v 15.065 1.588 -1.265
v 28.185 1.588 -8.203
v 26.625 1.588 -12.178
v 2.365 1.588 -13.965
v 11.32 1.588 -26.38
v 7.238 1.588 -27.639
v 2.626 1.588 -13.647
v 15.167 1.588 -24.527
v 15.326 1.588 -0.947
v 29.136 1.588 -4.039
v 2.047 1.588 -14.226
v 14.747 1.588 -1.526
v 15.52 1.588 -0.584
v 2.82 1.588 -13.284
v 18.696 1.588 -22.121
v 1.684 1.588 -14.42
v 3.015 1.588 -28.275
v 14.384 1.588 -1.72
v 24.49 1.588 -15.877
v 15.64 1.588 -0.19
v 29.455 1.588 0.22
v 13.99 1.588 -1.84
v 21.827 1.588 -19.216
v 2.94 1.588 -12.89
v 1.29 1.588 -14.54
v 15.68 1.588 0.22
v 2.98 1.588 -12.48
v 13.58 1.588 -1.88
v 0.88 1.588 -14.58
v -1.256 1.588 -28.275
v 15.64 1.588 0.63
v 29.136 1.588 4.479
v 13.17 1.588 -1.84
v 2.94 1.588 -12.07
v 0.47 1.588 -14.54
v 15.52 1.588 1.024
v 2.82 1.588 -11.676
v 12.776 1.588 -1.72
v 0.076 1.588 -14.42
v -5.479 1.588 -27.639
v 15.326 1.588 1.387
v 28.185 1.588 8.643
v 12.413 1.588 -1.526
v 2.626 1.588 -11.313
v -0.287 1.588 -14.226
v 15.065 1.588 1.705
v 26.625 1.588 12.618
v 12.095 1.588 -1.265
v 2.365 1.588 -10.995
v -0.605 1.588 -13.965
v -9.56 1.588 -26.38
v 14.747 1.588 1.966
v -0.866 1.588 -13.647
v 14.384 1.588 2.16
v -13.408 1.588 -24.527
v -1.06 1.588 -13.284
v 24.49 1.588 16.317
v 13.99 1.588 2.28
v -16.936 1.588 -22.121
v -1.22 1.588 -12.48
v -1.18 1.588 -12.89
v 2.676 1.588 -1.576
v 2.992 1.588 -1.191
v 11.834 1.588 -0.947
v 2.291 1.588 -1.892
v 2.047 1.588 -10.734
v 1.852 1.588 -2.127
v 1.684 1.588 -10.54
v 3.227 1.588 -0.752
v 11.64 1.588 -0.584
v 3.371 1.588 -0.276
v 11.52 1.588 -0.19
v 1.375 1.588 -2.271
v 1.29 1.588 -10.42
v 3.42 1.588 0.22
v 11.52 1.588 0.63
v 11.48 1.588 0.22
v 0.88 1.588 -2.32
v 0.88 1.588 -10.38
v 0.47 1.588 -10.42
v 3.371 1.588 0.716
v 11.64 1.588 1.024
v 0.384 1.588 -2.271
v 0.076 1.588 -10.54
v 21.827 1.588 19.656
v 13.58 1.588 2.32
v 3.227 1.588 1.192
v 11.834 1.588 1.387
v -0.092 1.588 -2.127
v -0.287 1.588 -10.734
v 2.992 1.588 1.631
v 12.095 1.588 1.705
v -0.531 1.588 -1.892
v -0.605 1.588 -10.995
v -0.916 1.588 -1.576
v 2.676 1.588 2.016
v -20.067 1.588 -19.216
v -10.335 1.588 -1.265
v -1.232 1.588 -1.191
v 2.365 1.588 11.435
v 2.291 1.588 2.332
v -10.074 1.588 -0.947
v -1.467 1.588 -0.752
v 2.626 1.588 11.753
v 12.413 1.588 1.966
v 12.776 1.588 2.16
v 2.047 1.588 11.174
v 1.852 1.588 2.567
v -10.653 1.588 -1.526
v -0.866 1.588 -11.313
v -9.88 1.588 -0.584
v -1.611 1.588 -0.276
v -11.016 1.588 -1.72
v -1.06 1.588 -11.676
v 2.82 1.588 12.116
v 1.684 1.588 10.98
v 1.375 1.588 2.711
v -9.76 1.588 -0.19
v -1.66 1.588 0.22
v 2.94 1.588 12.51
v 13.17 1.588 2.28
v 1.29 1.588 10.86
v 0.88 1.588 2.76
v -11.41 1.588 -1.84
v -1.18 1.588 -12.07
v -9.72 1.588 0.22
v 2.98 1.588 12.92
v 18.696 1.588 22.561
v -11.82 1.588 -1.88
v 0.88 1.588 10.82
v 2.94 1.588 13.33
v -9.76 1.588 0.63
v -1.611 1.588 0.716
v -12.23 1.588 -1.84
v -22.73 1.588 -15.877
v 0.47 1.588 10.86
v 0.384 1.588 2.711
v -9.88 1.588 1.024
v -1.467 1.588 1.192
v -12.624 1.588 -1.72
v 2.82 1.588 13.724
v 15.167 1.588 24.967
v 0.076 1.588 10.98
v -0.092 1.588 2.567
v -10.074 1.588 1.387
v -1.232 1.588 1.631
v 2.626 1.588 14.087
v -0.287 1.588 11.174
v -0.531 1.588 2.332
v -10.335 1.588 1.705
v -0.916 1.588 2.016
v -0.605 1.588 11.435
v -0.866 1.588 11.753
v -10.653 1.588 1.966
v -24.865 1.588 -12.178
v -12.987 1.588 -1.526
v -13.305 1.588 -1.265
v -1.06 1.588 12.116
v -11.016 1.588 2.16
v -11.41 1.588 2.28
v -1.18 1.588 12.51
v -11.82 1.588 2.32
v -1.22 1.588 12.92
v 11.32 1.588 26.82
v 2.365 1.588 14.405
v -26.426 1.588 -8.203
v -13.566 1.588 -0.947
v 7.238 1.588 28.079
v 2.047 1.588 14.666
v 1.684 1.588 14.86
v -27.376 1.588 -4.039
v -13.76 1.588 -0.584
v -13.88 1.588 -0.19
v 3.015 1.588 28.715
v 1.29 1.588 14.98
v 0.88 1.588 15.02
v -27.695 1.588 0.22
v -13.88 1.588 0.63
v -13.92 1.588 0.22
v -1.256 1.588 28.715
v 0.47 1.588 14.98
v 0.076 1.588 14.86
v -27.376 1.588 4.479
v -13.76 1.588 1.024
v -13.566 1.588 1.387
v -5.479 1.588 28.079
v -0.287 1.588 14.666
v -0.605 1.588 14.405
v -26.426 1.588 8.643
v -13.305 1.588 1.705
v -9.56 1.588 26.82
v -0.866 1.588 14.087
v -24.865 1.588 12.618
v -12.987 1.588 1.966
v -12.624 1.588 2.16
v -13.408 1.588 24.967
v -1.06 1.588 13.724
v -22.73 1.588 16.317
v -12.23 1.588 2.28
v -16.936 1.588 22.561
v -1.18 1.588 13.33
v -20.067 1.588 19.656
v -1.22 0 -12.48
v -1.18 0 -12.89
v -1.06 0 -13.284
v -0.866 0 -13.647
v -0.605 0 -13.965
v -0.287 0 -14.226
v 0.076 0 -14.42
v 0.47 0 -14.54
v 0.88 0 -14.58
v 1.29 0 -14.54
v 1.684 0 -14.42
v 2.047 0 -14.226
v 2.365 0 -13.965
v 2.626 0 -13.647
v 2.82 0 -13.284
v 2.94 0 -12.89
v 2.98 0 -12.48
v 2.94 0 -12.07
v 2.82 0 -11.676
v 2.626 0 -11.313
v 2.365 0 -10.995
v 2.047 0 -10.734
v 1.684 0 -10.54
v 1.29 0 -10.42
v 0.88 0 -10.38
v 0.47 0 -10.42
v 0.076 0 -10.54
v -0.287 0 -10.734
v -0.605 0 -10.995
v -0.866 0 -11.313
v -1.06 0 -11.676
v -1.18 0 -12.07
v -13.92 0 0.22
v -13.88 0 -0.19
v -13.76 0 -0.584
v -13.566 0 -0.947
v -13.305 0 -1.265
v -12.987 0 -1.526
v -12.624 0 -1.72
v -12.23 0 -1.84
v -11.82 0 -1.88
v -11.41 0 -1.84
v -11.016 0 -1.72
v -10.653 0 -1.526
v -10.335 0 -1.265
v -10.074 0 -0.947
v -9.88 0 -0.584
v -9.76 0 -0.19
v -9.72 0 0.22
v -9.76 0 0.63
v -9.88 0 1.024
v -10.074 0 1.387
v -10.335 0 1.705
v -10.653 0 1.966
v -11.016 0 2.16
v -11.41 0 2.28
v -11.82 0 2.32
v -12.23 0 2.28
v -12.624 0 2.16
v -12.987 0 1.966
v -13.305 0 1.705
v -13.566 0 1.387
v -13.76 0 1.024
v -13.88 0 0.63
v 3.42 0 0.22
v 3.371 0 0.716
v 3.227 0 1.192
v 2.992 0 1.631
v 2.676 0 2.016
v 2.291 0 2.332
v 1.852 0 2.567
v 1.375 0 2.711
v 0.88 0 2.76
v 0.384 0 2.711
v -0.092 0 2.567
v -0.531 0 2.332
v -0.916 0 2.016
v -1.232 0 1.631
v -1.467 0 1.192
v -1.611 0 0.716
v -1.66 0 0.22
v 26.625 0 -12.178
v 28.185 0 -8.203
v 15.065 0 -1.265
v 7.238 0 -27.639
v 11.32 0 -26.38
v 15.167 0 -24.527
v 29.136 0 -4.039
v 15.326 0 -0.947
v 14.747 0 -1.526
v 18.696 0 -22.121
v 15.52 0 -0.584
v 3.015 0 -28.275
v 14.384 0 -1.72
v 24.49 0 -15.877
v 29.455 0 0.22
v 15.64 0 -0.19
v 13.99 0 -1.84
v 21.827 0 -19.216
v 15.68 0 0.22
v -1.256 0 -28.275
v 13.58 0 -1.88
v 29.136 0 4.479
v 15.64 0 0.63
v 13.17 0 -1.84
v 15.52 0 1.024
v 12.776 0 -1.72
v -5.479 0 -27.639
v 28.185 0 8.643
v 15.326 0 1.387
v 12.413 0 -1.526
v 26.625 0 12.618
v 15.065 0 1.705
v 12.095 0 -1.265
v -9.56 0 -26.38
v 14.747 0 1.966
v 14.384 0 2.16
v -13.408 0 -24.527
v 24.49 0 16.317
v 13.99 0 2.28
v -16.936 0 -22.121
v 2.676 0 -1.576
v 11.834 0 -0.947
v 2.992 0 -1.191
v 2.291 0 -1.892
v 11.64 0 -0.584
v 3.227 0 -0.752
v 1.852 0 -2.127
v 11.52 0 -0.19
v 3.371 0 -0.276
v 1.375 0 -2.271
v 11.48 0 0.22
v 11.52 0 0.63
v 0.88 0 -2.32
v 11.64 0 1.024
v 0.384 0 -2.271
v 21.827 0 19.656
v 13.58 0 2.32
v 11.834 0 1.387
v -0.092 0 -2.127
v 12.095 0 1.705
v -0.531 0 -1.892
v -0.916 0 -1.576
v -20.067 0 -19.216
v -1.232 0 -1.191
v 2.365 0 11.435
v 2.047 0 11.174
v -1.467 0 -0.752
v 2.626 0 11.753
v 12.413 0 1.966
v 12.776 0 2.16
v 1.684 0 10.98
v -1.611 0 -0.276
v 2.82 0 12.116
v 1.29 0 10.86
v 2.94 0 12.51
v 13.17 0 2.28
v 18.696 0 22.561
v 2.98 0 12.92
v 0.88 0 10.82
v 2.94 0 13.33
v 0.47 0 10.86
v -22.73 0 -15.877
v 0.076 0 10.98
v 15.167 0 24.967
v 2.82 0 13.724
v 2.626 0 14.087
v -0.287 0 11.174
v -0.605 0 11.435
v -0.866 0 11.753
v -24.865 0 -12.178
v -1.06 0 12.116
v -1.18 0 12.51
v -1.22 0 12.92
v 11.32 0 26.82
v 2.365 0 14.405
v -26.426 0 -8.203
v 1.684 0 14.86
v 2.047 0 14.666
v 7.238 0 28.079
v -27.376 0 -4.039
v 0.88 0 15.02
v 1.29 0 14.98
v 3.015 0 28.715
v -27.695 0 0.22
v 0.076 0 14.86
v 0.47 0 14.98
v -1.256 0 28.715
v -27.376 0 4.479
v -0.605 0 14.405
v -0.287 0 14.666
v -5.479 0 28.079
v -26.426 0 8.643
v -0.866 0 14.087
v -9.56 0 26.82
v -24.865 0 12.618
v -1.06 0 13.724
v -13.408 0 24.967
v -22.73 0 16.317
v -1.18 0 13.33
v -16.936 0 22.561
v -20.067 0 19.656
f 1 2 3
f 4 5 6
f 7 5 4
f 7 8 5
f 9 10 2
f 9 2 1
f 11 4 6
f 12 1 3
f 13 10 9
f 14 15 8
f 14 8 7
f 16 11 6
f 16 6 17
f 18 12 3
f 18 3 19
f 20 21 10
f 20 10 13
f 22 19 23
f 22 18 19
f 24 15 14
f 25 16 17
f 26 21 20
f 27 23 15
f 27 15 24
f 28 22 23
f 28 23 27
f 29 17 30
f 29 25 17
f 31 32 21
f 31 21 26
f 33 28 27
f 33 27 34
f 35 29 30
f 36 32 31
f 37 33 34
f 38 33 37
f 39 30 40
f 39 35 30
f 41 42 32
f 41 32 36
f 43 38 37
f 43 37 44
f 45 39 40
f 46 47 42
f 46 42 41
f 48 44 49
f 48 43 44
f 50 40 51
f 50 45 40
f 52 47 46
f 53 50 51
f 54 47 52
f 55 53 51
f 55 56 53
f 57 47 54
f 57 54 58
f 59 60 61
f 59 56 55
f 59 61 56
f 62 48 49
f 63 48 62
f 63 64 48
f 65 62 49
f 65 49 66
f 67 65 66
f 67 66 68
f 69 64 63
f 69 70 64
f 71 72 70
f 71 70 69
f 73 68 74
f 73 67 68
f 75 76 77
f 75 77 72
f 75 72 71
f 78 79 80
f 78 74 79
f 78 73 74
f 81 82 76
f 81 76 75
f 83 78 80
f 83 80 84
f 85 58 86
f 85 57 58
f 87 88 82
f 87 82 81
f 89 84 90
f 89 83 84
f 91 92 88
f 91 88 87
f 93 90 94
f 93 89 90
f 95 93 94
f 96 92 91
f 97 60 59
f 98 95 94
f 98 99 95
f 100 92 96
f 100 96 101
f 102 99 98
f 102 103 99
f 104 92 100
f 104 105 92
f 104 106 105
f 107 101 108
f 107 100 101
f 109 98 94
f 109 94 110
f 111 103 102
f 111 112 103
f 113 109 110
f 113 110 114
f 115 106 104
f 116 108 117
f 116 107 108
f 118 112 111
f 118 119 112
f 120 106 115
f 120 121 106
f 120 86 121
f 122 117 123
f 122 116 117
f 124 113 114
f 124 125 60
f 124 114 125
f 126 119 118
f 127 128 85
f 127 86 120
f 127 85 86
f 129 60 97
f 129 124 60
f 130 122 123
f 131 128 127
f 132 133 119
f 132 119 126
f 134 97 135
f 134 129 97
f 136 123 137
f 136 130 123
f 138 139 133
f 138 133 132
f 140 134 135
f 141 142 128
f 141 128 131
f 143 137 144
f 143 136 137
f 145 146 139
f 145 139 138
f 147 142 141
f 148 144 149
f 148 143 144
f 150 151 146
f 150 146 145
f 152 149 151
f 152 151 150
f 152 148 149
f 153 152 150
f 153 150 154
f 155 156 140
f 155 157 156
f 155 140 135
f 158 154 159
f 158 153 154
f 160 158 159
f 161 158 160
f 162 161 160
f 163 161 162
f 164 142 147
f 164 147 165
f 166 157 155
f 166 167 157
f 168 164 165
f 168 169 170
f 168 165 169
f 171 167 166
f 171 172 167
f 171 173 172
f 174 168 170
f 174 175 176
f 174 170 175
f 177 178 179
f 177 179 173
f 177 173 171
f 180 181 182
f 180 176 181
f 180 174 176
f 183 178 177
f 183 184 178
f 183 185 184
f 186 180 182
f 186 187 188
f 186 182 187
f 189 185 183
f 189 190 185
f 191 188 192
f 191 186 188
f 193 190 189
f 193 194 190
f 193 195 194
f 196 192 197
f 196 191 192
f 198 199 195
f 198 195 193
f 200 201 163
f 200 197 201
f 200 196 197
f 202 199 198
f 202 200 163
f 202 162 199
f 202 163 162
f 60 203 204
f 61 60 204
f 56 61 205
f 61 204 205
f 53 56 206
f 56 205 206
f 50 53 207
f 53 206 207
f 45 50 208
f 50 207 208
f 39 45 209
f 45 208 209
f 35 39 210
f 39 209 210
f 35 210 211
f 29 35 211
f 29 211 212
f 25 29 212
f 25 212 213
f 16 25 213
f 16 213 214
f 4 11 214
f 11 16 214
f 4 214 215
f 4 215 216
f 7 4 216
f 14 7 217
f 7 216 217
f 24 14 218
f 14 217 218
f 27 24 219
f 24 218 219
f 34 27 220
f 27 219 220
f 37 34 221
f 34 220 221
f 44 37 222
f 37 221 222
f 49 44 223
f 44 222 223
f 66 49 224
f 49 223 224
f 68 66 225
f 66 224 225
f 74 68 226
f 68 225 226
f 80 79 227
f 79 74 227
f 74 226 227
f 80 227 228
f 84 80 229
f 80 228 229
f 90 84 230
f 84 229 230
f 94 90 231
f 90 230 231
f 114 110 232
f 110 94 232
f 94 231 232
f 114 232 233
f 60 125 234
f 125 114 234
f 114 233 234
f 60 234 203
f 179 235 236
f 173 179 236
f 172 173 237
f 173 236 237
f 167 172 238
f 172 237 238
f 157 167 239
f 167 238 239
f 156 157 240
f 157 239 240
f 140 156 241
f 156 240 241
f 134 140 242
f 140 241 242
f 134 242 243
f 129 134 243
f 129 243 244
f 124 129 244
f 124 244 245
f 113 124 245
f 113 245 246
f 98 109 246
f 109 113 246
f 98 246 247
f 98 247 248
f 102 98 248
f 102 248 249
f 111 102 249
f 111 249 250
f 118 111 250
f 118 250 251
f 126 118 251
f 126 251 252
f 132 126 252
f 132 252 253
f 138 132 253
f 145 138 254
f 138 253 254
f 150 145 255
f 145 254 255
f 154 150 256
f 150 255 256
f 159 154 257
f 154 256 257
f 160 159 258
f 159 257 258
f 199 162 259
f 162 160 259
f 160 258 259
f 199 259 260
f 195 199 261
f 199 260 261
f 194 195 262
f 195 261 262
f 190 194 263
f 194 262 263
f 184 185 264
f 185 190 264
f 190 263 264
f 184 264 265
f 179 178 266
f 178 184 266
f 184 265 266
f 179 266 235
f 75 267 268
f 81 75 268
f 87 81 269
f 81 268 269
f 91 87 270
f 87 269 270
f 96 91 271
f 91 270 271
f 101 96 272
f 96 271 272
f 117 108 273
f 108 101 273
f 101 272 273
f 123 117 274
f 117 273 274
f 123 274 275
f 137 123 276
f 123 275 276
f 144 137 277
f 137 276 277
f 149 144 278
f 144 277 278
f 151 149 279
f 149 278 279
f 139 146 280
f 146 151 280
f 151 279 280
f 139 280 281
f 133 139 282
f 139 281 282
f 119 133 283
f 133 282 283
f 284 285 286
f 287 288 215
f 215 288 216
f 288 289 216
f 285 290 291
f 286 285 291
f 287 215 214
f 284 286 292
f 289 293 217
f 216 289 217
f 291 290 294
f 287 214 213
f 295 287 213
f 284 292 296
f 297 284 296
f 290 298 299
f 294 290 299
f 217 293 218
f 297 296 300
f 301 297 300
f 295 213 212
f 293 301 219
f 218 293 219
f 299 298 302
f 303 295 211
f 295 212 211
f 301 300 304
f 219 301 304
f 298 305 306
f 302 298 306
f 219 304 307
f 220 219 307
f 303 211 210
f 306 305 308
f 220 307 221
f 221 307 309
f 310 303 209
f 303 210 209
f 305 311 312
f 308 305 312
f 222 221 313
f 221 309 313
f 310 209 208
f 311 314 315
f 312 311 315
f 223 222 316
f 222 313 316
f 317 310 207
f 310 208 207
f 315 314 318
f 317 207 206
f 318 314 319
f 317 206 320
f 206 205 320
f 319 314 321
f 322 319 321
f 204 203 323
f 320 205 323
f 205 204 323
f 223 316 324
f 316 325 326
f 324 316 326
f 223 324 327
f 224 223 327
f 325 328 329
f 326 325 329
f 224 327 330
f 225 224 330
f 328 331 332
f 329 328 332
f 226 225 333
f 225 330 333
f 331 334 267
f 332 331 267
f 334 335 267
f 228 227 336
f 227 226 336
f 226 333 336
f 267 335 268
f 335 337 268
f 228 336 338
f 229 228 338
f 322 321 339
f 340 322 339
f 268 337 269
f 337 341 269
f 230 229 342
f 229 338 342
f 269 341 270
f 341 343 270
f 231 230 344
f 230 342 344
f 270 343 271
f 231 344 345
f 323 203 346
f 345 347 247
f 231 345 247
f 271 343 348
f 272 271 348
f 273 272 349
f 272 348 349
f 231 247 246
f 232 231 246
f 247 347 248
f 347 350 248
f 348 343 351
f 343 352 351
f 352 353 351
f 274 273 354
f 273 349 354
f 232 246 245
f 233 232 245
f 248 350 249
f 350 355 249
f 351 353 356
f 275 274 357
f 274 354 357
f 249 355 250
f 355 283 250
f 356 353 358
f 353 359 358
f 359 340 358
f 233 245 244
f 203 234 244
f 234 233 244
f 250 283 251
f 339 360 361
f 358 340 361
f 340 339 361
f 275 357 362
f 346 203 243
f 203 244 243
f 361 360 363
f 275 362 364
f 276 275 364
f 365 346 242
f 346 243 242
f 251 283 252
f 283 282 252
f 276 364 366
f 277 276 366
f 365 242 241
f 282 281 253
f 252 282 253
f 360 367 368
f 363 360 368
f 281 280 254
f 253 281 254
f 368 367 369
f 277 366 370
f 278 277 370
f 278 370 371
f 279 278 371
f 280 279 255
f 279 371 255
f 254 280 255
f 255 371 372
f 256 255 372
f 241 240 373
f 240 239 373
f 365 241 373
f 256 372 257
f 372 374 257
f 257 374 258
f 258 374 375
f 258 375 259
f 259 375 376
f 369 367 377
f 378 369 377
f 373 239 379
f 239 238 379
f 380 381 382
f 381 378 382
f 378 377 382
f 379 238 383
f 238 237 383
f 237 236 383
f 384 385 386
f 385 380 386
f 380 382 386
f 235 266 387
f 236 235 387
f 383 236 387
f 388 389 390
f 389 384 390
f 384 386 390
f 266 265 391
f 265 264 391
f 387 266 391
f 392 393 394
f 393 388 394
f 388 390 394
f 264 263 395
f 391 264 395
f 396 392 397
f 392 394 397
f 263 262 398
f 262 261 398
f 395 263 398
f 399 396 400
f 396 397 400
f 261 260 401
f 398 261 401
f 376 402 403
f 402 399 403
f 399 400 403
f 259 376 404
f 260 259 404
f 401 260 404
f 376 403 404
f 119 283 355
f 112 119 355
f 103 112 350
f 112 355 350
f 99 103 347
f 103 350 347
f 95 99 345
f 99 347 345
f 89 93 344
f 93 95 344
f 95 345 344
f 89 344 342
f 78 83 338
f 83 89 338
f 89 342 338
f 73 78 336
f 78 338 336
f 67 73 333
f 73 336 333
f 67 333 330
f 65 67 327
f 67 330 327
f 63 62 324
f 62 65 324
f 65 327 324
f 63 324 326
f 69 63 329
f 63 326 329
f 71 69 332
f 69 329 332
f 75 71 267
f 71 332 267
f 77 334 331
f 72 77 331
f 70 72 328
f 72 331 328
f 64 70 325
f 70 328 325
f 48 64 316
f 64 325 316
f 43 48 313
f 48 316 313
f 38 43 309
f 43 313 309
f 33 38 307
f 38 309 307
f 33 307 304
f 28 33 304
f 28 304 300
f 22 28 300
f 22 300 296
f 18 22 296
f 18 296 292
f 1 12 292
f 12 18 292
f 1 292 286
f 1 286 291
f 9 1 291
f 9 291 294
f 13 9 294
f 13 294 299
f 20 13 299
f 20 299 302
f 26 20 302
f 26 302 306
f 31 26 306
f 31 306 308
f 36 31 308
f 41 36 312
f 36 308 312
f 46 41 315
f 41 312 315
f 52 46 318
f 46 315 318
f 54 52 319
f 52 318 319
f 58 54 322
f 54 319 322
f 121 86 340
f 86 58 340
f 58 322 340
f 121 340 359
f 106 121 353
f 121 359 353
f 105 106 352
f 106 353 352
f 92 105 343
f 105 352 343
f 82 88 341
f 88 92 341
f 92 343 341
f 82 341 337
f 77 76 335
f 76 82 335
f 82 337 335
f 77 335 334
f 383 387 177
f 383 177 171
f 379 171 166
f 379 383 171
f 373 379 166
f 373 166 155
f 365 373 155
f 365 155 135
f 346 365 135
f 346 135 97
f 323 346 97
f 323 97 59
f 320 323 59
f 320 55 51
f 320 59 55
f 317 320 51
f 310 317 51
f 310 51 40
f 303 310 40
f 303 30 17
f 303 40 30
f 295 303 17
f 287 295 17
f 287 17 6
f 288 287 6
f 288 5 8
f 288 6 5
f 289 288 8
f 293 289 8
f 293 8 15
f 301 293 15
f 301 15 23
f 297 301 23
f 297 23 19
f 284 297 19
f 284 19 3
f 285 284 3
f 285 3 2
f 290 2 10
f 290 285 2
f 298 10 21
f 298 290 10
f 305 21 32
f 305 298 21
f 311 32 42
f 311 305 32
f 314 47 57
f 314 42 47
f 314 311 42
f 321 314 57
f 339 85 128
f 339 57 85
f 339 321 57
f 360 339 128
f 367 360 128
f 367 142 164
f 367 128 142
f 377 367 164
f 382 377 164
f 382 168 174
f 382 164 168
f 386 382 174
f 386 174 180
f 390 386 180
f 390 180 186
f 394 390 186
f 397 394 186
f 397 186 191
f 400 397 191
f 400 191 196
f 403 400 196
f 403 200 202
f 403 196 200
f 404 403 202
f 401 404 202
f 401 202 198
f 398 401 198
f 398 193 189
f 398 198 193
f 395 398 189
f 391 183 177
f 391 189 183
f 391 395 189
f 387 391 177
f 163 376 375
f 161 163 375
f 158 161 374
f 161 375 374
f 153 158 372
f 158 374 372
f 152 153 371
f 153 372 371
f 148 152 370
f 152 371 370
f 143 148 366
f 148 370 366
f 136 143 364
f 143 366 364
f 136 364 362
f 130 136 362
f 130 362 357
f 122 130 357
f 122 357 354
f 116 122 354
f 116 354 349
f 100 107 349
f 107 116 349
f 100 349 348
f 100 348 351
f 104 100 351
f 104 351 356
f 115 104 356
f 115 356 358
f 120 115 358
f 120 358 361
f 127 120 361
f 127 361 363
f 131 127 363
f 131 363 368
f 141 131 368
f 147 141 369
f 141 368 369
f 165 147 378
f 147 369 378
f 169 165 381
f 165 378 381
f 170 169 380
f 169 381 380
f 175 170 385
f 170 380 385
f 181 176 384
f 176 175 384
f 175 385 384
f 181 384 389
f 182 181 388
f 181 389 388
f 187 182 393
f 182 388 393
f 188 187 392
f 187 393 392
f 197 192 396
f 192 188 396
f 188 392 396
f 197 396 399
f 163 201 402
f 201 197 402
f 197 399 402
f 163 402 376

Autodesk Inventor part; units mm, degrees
ref_plane "YZ Plane" through (0, 0, 0) normal (1, 0, 0) x (0, 1, 0)
ref_plane "XZ Plane" through (0, 0, 0) normal (0, 1, 0) x (-1, 0, 0)
ref_plane "XY Plane" through (0, 0, 0) normal (0, 0, 1) x (1, 0, 0)
sketch "Sketch1" plane through (0, 0, 0) normal (0, 1, 0) x (-1, 0, 0)
  circle A0 centre (-0.8799, 12.92) radius 2.1
  circle A1 centre (-13.5799, 0.22) radius 2.1
  circle A2 centre (-0.8799, -12.48) radius 2.1
  circle A3 centre (11.8201, 0.22) radius 2.1
  circle A4 centre (-0.8799, 0.22) radius 28.575
  line L0 (-13.5799, 0.22) -> (-0.8799, 0.22)
  circle A5 centre (-0.8799, 0.22) radius 2.54
  point P0 (0, 0)
  dimension "d0" = 57.15
  dimension "d1" = 5.08
extrude "Extrusion1" add sketch "Sketch1" along normal blind 1.5875
sketch "Sketch2" plane through (0, 0, 0) normal (0, 1, 0) x (-1, 0, 0)
  circle A0 centre (-0.8799, 0.22) radius 28.575 projected
  circle A1 centre (-13.5799, 0.22) radius 2.1 projected
  circle A2 centre (-0.8799, -12.48) radius 2.1 projected
  circle A3 centre (-0.8799, 0.22) radius 2.54 projected
  circle A4 centre (-0.8799, 12.92) radius 2.1 projected
  circle A5 centre (11.8201, 0.22) radius 2.1 projected
  point P0 (0, 0)
equation "\"BendRadius\" = Thickness"
equation "\"BendReliefWidth\" = Thickness"
equation "\"BendReliefDepth\" = 0.5 * Thickness"
equation "\"CornerReliefSize\" = 4 * Thickness"
equation "\"MinimumRemnant\" = 2 * Thickness"
equation "\"TransitionRadius\" = BendRadius"
equation "\"JacobiRadiusSize\" = BendRadius"
equation "\"GapSize\" = Thickness"
equation "\"Thickness\" = 1.5875"
